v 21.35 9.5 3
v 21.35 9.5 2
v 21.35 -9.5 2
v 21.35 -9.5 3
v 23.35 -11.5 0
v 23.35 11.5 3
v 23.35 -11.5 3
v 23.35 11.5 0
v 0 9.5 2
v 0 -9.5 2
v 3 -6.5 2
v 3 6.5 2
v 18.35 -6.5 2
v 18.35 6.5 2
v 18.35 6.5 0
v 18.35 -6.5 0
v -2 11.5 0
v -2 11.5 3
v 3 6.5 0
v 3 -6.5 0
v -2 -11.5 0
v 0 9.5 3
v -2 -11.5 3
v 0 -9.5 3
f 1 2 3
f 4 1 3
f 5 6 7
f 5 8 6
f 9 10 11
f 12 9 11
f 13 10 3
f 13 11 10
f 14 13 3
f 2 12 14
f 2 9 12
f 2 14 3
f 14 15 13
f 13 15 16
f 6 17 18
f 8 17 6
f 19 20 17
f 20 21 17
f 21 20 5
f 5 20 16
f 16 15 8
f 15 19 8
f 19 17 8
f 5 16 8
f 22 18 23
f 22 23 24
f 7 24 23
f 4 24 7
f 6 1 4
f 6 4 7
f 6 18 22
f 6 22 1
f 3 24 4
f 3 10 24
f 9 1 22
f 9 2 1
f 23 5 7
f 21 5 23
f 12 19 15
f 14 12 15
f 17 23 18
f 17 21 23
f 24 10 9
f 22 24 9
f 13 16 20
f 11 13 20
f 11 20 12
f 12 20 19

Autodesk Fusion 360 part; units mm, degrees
sketch "BasePlate" plane through (0, 0, 0) normal (0, 0, 1) x (1, 0, 0)
  line L0 (21.35, 9.5) -> (0, 9.5)
  line L1 (21.35, 9.5) -> (21.35, -9.5)
  line L2 (0, -9.5) -> (0, 9.5)
  line L3 (0, -9.5) -> (21.35, -9.5)
  line L4 (-2, 11.5) -> (23.35, 11.5)
  line L5 (23.35, 11.5) -> (23.35, -11.5)
  line L6 (23.35, -11.5) -> (-2, -11.5)
  line L7 (-2, -11.5) -> (-2, 11.5)
  line L8 (3, 6.5) -> (18.35, 6.5)
  line L9 (18.35, 6.5) -> (18.35, -6.5)
  line L10 (18.35, -6.5) -> (3, -6.5)
  line L11 (3, -6.5) -> (3, 6.5)
  dimension "d4" = 21.35
  dimension "d13" = 19
extrude "Extrude1" add sketch "BasePlate" along normal blind 2 contours L0 L1 L2 L3
extrude "Extrude2" add sketch "BasePlate" along normal blind 3 contours L4 L5 L6 L7
